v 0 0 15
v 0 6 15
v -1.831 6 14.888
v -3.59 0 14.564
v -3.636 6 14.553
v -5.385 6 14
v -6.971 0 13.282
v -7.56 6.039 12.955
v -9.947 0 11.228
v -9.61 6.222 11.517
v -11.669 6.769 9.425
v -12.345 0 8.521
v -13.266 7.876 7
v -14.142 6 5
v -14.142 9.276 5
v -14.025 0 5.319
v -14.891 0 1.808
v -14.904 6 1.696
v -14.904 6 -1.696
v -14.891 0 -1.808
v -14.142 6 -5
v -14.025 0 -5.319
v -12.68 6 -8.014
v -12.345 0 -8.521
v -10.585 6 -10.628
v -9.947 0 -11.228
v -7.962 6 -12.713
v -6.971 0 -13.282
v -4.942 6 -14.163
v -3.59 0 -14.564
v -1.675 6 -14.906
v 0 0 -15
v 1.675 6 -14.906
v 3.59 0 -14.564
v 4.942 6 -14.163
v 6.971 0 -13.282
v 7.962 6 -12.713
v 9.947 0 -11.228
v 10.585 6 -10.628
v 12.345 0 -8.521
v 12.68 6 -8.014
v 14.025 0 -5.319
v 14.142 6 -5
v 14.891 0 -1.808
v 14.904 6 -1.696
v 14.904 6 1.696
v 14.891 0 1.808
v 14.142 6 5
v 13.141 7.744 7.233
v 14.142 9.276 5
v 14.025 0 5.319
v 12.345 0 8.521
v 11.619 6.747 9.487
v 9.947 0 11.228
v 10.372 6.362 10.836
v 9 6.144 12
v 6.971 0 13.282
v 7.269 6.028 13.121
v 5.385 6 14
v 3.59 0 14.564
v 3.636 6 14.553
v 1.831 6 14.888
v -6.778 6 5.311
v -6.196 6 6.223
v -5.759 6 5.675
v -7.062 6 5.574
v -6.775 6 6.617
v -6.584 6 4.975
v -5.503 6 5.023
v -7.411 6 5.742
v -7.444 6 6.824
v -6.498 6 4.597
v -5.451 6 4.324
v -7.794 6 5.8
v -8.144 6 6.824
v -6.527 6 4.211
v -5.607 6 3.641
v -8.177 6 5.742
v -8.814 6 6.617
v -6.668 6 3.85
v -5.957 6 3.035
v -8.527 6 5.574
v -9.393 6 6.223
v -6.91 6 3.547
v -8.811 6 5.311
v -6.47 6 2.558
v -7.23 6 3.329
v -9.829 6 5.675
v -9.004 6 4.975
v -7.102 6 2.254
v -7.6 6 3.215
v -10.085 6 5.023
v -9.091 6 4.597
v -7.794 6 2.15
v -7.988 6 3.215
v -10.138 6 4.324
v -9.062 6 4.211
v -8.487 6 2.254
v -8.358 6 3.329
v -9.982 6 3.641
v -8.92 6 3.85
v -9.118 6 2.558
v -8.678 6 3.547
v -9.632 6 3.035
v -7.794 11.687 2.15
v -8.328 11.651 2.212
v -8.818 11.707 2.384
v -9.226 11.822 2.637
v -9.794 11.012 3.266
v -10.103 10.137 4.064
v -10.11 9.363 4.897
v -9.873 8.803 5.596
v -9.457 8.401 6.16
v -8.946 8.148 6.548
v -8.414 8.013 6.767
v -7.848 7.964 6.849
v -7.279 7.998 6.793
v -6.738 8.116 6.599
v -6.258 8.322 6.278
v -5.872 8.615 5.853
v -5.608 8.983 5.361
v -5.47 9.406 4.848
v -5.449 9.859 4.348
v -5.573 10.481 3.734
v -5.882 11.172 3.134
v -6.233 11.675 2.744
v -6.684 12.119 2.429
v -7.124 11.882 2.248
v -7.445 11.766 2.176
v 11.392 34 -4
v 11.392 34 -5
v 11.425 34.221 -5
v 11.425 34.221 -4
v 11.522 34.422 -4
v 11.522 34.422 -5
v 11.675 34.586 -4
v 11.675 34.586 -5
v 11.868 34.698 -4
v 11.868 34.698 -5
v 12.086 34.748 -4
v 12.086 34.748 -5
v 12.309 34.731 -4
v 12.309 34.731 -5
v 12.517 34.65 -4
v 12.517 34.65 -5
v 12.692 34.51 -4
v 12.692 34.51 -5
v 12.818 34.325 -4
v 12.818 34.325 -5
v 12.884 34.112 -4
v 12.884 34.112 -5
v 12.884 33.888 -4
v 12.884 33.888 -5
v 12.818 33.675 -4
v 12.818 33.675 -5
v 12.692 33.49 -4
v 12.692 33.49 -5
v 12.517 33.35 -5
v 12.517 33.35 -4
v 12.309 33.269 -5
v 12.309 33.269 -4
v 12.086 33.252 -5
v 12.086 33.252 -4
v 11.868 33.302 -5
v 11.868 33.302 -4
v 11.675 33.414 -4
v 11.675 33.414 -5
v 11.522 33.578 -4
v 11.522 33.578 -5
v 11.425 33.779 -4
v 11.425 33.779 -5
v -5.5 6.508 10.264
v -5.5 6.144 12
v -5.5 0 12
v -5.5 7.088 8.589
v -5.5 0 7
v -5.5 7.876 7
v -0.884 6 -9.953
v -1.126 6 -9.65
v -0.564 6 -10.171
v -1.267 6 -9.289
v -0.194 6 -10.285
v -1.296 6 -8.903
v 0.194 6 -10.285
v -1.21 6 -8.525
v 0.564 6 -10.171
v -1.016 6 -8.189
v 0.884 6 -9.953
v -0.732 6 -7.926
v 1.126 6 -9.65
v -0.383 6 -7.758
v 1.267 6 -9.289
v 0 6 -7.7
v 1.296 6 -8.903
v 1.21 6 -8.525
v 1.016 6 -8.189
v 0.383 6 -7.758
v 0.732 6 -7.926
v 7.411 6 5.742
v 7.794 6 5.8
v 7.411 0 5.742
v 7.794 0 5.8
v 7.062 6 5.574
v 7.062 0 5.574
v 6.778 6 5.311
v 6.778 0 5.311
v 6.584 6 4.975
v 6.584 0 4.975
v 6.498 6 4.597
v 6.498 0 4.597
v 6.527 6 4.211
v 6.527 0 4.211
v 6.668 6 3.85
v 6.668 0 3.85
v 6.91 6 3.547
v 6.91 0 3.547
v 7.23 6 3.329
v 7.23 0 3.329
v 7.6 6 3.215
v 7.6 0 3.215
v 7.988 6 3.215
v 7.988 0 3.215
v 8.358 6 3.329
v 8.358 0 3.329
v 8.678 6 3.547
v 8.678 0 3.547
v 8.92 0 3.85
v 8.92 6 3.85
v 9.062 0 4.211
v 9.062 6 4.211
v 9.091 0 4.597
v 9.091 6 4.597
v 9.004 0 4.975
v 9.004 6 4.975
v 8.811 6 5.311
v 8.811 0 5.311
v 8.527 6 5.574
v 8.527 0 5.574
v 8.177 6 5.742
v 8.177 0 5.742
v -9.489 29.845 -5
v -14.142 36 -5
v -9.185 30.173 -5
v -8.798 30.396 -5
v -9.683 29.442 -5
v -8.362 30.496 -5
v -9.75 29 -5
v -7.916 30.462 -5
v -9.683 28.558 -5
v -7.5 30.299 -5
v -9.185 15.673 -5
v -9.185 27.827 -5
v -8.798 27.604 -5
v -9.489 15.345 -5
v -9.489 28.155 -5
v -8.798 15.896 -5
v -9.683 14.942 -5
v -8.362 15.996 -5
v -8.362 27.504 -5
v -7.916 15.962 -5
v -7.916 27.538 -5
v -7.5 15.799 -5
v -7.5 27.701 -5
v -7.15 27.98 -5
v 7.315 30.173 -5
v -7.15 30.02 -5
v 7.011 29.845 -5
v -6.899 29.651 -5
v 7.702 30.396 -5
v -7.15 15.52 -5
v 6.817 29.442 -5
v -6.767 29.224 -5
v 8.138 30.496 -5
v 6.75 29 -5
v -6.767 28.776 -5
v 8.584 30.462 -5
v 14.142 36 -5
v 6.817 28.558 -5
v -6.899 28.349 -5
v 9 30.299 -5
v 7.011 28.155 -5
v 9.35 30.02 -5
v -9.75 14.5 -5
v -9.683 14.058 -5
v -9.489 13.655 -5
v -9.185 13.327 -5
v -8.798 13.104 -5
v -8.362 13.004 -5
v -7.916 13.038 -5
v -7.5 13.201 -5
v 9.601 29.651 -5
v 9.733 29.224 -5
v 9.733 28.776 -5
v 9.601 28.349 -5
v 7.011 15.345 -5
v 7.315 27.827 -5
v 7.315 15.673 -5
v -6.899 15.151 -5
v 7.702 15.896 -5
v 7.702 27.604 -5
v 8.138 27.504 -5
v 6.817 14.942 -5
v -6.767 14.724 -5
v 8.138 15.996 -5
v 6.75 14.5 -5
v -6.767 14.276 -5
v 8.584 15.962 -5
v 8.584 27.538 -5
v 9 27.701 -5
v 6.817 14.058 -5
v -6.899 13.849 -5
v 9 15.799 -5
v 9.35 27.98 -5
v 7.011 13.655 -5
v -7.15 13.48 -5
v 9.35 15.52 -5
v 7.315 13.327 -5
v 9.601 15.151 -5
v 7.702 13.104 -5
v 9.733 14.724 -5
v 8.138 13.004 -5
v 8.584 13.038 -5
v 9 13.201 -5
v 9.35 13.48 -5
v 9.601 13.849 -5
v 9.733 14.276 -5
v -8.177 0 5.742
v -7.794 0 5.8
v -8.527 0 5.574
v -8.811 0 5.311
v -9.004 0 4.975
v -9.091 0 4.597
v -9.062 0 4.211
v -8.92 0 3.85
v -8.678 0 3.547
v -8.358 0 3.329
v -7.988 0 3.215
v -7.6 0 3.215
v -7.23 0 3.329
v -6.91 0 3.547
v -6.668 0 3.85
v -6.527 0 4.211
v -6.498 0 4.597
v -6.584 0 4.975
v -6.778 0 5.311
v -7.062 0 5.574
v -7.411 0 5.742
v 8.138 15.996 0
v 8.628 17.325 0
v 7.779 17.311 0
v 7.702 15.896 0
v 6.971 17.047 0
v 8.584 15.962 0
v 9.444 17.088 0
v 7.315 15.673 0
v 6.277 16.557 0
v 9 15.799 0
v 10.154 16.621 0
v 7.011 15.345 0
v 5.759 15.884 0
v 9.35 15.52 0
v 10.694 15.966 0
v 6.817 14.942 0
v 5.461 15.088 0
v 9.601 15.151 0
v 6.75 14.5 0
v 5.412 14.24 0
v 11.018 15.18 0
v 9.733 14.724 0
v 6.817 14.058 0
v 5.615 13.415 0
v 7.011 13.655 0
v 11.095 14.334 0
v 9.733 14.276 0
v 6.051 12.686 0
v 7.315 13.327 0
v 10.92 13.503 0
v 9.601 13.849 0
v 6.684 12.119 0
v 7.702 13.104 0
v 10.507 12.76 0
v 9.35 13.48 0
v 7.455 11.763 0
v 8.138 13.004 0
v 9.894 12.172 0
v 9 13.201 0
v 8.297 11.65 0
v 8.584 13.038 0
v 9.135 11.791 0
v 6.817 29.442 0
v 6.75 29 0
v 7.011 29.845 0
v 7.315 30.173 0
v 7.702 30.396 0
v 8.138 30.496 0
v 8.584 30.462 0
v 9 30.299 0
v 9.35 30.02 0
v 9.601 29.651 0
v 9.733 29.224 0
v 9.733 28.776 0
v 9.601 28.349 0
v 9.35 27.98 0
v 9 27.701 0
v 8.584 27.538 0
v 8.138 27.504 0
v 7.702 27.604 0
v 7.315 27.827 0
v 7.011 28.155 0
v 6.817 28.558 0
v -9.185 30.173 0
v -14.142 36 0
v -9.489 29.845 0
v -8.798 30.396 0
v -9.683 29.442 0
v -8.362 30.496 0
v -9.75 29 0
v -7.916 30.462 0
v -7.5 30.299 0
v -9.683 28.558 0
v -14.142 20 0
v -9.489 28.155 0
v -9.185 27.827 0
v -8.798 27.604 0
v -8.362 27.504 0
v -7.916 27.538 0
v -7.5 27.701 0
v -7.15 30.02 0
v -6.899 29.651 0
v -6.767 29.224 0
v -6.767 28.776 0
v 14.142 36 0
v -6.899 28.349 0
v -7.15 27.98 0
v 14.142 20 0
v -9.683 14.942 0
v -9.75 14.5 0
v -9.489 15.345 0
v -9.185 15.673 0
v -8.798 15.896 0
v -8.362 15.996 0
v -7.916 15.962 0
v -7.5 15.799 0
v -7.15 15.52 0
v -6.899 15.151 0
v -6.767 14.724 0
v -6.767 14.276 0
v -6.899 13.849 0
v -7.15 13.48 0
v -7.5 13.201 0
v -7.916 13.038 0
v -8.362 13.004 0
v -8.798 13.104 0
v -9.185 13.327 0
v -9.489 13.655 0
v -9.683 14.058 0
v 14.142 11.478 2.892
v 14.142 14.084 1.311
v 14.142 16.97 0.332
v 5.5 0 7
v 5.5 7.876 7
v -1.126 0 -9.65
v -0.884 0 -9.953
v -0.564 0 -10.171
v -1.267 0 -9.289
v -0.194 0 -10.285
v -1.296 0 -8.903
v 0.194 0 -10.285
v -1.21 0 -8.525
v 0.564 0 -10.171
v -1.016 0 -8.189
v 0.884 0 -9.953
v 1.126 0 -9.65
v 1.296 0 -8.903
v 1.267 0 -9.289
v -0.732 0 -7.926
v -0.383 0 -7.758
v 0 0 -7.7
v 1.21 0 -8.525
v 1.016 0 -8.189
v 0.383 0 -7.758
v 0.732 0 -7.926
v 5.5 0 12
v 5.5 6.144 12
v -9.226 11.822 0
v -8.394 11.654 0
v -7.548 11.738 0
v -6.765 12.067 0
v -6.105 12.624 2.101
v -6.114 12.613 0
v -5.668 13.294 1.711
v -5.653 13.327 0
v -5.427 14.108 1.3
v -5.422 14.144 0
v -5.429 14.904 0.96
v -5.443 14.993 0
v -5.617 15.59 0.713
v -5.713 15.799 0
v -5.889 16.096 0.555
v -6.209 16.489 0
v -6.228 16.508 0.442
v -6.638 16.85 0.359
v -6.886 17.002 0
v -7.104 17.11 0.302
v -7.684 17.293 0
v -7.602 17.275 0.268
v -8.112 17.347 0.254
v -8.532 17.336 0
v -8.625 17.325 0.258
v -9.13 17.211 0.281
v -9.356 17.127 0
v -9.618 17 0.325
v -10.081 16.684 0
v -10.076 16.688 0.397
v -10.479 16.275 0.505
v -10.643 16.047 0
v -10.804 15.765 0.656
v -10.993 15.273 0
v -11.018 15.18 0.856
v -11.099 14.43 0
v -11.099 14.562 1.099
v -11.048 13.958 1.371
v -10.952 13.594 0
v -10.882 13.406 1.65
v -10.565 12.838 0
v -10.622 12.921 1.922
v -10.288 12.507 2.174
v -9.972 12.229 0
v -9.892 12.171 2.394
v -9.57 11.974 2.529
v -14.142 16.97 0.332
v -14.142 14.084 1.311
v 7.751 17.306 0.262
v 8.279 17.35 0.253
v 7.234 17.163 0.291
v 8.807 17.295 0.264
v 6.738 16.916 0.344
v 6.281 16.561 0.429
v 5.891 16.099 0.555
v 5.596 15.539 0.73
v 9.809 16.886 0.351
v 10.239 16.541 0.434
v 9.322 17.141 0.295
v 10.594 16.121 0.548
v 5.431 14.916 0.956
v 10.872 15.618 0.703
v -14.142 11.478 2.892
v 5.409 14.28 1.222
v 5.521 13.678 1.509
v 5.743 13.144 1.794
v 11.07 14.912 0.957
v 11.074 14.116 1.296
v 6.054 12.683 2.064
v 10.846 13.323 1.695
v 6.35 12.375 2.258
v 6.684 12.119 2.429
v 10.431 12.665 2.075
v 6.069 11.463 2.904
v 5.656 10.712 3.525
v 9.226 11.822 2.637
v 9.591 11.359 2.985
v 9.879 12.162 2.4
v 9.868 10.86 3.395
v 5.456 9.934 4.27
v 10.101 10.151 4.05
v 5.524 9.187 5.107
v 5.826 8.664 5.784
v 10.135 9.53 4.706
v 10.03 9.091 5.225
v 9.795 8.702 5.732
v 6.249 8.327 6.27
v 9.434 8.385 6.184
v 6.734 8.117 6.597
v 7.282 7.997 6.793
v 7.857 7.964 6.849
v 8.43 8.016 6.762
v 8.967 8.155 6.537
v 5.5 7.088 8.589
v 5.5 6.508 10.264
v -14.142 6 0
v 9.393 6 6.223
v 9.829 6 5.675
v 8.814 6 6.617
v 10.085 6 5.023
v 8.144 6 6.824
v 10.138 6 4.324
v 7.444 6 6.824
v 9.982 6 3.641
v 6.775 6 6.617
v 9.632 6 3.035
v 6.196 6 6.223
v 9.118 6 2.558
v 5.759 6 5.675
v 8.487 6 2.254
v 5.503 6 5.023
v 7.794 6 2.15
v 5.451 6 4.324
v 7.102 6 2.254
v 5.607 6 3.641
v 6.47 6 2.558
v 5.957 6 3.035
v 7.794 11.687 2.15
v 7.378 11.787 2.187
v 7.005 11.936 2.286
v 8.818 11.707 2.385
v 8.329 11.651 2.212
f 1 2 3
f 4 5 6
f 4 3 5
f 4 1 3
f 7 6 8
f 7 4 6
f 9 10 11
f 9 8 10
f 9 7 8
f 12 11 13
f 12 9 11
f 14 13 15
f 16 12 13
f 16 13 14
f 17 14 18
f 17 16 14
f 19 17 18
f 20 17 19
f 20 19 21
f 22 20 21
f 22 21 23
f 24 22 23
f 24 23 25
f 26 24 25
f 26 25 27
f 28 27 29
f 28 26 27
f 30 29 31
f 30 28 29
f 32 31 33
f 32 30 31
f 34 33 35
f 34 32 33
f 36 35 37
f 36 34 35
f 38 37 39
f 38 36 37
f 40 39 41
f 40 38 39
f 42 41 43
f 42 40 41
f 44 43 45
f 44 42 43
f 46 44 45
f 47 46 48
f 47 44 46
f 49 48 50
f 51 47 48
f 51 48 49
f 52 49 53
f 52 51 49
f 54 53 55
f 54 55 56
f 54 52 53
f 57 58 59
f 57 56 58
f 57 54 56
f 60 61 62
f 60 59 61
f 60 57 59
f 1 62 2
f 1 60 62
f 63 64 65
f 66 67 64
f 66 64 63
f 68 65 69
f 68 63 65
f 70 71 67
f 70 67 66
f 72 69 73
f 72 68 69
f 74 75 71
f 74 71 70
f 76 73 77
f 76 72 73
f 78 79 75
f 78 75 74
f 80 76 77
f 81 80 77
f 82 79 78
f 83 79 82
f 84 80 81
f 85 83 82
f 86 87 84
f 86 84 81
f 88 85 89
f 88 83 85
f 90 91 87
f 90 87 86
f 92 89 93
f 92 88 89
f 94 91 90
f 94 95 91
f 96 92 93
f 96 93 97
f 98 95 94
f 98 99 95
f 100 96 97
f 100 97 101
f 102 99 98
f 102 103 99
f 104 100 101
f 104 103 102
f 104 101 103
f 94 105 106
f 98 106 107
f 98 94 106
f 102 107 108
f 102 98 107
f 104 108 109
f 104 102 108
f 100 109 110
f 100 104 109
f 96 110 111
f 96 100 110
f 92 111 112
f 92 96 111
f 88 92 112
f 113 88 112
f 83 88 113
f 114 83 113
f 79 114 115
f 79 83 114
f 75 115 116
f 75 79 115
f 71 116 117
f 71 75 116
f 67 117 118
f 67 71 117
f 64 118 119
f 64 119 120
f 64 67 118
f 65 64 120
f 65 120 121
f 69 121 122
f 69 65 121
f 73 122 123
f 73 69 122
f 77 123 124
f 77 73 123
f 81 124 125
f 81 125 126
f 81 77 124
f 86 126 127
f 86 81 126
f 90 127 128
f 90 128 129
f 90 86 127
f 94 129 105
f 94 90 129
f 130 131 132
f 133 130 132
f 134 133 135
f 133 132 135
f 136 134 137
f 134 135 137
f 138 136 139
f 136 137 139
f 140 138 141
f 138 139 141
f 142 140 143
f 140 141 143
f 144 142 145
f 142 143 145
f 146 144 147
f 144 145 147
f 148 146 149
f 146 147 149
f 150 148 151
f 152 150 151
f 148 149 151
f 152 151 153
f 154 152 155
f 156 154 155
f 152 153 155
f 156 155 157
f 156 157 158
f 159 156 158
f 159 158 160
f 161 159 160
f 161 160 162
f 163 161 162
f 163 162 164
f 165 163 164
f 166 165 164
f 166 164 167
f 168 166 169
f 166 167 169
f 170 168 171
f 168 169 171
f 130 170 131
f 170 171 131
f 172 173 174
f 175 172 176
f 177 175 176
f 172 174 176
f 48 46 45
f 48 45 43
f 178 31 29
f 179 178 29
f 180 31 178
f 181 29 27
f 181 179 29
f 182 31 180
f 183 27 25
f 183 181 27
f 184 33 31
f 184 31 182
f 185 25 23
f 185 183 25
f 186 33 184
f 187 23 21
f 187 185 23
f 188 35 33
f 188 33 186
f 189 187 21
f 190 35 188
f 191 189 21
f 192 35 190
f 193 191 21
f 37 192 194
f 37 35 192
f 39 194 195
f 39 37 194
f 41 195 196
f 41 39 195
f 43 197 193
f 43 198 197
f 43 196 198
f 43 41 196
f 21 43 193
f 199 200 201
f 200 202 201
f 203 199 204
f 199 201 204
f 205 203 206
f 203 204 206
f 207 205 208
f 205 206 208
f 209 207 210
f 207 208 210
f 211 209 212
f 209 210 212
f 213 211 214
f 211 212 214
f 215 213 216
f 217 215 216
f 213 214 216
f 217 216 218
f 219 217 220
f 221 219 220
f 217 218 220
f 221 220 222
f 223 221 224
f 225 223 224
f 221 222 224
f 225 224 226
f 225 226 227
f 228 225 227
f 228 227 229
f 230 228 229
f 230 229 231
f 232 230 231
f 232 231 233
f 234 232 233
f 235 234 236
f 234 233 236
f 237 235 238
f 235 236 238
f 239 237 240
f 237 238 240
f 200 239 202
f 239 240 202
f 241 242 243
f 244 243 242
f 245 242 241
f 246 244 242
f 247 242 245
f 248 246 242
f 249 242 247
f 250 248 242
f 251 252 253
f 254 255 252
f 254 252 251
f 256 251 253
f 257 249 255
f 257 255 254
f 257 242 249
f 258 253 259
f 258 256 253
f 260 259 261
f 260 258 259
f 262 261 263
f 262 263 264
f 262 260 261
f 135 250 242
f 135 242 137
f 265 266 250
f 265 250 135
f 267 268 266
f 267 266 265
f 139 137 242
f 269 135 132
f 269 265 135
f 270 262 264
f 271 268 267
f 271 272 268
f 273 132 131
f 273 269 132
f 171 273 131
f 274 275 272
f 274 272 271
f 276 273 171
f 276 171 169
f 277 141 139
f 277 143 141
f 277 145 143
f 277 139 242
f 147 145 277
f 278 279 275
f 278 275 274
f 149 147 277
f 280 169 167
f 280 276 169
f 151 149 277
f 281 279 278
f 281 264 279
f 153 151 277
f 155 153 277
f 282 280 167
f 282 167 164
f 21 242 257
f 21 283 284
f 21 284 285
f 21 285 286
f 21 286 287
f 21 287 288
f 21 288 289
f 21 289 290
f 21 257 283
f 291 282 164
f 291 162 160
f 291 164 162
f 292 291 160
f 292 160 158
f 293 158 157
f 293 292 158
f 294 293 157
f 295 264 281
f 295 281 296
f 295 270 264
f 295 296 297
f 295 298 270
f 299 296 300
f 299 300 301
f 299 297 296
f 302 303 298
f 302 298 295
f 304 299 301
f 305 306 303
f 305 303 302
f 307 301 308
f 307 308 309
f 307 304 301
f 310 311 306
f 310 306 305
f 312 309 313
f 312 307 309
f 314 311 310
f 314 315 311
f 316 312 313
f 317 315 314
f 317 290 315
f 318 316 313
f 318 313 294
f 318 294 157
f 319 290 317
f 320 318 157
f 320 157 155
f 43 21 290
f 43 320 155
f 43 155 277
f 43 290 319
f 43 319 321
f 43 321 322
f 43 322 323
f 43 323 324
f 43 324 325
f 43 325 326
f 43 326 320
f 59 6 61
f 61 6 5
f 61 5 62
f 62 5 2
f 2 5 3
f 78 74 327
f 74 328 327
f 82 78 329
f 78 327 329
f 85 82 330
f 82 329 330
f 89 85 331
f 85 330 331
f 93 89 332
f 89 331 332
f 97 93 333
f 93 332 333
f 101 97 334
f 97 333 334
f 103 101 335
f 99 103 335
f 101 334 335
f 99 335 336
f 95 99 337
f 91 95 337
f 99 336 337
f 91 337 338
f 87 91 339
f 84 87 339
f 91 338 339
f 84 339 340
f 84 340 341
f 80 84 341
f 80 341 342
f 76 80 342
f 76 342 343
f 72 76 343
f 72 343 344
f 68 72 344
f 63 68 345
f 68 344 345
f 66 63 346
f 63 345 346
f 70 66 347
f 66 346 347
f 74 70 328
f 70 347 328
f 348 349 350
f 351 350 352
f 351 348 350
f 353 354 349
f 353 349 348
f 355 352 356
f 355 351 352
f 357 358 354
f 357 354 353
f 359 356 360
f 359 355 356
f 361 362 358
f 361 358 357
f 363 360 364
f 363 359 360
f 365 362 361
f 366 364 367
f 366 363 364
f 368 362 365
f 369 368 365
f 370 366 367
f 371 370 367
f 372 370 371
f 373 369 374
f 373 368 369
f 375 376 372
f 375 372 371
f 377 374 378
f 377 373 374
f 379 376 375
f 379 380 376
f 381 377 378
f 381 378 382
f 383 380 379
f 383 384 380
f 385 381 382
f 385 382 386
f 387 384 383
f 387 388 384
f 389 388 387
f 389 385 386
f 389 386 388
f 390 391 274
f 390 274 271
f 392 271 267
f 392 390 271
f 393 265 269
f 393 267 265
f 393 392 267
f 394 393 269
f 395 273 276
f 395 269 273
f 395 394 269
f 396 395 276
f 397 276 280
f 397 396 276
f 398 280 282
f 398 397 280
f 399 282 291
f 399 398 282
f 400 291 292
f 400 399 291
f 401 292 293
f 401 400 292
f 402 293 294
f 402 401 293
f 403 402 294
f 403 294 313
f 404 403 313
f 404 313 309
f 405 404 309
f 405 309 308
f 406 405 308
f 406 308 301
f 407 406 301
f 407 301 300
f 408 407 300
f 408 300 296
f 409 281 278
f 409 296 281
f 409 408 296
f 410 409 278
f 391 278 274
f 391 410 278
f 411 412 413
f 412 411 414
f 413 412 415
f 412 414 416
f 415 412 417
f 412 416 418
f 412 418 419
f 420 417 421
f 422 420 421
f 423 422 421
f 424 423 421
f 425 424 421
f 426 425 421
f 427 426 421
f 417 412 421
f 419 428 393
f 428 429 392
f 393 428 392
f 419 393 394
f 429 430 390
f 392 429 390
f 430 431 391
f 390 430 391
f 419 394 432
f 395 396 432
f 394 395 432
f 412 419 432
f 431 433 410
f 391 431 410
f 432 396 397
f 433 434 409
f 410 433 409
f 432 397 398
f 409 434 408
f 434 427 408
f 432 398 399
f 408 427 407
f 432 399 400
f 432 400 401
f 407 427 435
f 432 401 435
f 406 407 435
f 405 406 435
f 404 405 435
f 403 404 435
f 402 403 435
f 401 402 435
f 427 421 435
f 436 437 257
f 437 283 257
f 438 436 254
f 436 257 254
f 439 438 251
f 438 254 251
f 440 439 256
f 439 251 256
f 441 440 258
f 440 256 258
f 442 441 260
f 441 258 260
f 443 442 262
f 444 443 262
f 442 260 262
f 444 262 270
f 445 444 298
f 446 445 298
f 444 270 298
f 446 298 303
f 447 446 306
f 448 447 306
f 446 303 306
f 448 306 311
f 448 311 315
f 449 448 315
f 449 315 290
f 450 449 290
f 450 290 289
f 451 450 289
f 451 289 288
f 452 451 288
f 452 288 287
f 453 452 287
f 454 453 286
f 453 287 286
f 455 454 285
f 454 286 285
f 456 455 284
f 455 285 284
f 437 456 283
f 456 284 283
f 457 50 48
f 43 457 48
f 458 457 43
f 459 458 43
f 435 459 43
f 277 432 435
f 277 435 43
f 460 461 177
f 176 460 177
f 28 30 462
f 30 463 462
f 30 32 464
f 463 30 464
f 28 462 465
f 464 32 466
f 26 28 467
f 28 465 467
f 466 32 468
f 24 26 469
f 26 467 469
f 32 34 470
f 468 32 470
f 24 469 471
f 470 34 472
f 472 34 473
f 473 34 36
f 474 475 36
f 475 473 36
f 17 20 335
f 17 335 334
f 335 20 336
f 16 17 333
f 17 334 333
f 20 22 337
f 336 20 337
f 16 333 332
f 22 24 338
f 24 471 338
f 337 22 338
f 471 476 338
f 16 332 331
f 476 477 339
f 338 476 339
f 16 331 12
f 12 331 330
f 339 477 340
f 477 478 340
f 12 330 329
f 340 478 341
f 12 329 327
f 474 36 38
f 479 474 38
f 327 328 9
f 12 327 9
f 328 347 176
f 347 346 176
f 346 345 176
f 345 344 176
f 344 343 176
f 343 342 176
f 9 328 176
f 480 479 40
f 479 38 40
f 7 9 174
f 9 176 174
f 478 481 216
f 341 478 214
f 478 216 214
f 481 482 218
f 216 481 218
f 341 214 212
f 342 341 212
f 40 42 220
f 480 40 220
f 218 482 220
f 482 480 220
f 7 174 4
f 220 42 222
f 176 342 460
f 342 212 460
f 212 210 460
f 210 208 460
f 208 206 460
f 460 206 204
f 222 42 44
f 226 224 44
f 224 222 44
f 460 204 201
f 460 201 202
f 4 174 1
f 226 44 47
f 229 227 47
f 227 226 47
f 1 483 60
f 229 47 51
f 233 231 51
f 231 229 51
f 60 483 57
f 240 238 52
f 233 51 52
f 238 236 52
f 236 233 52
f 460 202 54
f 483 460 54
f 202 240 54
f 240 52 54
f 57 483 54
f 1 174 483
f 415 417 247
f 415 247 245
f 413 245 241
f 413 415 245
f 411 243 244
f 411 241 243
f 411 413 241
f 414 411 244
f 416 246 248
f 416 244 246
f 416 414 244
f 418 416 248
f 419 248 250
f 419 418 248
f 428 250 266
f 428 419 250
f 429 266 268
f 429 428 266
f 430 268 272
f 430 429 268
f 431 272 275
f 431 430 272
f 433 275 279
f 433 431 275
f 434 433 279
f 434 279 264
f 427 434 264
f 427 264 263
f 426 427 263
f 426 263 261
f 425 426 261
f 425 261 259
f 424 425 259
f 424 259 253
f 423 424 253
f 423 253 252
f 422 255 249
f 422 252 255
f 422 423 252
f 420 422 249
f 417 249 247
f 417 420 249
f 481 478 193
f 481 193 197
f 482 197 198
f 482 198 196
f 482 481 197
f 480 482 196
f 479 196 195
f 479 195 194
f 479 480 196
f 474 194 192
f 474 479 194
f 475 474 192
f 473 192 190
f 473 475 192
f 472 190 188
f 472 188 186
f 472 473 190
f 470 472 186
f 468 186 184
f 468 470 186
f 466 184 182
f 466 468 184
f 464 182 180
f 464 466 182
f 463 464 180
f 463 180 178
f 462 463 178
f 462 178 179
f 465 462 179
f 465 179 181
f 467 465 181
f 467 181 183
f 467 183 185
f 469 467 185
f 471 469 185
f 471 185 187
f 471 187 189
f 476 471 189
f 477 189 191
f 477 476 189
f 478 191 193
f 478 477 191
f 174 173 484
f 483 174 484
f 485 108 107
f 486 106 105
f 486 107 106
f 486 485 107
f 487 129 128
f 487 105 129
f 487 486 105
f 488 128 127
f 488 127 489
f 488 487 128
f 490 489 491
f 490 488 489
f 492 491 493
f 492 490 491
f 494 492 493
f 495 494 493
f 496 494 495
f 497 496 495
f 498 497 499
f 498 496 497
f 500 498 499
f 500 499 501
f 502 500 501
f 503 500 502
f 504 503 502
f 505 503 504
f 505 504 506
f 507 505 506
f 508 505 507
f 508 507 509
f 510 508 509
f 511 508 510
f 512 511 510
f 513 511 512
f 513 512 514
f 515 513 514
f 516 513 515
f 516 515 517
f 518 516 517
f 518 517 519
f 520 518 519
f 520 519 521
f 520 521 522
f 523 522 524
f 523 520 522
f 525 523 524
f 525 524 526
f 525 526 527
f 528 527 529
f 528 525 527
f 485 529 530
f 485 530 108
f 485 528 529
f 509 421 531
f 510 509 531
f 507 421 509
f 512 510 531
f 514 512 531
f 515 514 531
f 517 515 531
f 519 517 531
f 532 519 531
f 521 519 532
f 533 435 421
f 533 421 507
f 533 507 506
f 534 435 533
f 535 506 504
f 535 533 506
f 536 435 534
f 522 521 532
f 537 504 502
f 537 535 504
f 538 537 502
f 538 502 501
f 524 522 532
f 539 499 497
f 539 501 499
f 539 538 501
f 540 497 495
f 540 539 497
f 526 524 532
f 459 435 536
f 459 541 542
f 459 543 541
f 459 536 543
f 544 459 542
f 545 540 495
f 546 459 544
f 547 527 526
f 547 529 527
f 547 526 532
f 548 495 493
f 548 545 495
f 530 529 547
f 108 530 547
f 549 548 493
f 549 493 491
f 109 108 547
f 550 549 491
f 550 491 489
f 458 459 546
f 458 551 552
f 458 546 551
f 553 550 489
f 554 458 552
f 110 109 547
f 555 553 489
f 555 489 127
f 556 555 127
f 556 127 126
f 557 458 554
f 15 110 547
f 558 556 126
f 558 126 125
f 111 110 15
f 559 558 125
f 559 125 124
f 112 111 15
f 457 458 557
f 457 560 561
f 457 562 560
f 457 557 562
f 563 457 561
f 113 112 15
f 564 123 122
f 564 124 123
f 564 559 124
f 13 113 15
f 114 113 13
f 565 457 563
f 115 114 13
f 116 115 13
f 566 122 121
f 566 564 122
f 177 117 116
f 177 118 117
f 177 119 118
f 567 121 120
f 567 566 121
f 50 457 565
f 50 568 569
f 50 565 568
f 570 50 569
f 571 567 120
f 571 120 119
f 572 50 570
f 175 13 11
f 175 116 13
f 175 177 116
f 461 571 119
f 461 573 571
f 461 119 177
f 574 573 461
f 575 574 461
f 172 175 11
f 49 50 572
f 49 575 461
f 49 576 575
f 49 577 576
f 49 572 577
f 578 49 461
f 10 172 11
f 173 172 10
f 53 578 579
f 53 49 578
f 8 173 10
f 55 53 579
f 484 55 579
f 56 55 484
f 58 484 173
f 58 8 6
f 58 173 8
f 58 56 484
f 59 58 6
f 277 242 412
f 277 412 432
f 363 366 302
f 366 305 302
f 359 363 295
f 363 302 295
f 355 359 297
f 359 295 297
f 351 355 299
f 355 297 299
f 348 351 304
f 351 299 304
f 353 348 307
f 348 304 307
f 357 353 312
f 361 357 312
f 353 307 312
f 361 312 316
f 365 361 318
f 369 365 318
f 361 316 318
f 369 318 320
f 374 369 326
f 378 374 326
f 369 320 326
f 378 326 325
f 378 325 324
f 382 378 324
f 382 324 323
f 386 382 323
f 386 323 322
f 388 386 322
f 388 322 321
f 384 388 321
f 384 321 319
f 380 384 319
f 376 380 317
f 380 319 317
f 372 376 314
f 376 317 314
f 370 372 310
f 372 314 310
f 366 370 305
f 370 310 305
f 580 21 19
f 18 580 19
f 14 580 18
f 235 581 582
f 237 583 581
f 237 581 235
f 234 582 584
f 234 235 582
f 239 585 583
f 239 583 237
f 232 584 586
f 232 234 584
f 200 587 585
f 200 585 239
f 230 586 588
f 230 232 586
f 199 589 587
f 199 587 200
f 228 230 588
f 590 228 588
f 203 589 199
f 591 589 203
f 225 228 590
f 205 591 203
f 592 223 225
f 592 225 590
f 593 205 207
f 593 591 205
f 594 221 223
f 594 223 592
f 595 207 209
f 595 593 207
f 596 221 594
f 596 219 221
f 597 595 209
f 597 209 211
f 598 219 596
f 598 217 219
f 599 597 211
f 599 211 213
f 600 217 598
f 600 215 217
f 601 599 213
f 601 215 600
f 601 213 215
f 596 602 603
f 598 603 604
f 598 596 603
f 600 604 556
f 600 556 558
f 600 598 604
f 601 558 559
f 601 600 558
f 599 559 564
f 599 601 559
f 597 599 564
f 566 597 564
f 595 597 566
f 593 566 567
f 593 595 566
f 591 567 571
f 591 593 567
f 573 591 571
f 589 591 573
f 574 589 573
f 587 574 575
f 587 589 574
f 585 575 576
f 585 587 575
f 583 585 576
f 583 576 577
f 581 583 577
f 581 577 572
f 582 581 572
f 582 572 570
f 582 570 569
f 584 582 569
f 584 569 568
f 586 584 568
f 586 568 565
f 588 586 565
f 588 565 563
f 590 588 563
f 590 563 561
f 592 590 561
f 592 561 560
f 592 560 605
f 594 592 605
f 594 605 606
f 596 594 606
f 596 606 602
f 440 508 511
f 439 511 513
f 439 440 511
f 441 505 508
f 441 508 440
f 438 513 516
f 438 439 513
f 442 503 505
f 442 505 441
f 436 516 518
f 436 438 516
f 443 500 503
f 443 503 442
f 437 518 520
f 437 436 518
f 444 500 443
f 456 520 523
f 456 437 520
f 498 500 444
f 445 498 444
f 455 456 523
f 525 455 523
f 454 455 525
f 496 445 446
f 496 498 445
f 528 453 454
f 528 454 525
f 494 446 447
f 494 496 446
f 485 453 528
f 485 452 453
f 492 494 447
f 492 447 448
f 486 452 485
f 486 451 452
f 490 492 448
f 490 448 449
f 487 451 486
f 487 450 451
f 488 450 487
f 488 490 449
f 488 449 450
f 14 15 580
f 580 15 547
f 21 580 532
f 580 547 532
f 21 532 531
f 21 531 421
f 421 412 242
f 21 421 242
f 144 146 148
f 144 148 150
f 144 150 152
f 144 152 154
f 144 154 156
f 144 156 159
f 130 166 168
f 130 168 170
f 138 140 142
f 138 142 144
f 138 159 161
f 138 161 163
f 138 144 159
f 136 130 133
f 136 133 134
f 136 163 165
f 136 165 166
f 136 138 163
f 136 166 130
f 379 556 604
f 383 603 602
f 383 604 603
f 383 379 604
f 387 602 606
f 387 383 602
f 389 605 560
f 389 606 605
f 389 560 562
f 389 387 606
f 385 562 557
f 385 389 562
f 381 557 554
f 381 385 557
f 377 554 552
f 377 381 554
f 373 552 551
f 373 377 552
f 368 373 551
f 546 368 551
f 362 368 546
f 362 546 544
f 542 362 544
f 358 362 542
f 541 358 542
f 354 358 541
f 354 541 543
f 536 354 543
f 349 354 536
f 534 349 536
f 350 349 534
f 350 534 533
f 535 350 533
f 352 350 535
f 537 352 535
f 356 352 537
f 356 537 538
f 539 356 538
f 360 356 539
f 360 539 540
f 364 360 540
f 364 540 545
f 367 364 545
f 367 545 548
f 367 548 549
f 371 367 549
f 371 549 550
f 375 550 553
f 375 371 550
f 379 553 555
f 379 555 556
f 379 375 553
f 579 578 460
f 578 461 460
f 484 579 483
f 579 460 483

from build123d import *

# Parameters (mm, degrees)
SKETCH_1_R               = 15
SKETCH_1_R_2             = 1.3
SKETCH_1_W               = 11
SKETCH_1_H               = 5
EXTRUDE_1_DEPTH          = 6
SKETCH_2_W               = 28.284271248
SKETCH_2_H               = 5
EXTRUDE_2_DEPTH          = 30
CUT_EXTRUDE_1_DEPTH      = 44.829214002
CUT_EXTRUDE_1_DEPTH_BACK = 44.829214002
SKETCH_3_R               = 1.5
FILLET_2_R               = 14
SKETCH_4_R               = 2.35
CUT_EXTRUDE_2_DEPTH      = 37.742346223
SKETCH_5_R               = 2.85
CUT_EXTRUDE_3_DEPTH      = 42.785164903
SKETCH_6_R               = 0.75
CUT_EXTRUDE_4_DEPTH      = 1


with BuildPart() as part:
    # 草图1 → 凸台-拉伸1 (new body)
    with BuildSketch(Plane(origin=(0, 0, 0), x_dir=(1, 0, 0), z_dir=(0, 1, 0))):
        with Locations(Location((0, 0, 0), (0, 0, 270))):
            Circle(SKETCH_1_R)
        with Locations(Location((0, 9, 0), (0, 0, 270))):
            Circle(SKETCH_1_R_2, mode=Mode.SUBTRACT)
        with Locations(Location((7.794228634, -4.5, 0), (0, 0, 270))):
            Circle(SKETCH_1_R_2, mode=Mode.SUBTRACT)
        with Locations(Location((-7.794228634, -4.5, 0), (0, 0, 270))):
            Circle(SKETCH_1_R_2, mode=Mode.SUBTRACT)
        with Locations((0, -9.5)):
            Rectangle(SKETCH_1_W, SKETCH_1_H, mode=Mode.SUBTRACT)
    extrude(amount=EXTRUDE_1_DEPTH)

    # 草图2 → 凸台-拉伸2 (add)
    with BuildSketch(Plane(origin=(0, 6, 0), x_dir=(1, 0, 0), z_dir=(0, 1, 0))):
        with Locations((0, 2.5)):
            Rectangle(SKETCH_2_W, SKETCH_2_H)
    extrude(amount=EXTRUDE_2_DEPTH)

    # 草图3 → 切除-拉伸1 (cut, two sides: drawn at the far end of the back side and taken through both)
    with BuildSketch(Plane(origin=(0, 0, -5), x_dir=(-1, 0, 0), z_dir=(0, 0, -1)).offset(-CUT_EXTRUDE_1_DEPTH_BACK)):
        with Locations((-8.25, 14.5)):
            Circle(SKETCH_3_R)
        with Locations((8.25, 14.5)):
            Circle(SKETCH_3_R)
        with Locations((8.25, 29)):
            Circle(SKETCH_3_R)
        with Locations((-8.25, 29)):
            Circle(SKETCH_3_R)
    extrude(amount=CUT_EXTRUDE_1_DEPTH + CUT_EXTRUDE_1_DEPTH_BACK, mode=Mode.SUBTRACT)

    # 圆角2
    # the kernel refuses this fillet: 14 mm, written as the material it adds along each edge
    with BuildSketch(Plane(origin=(49.142135624, 6, 0), x_dir=(0, 0, 1), z_dir=(-1, 0, 0))) as fillet_2_piece_1_section:
        with BuildLine():
            CenterArc((FILLET_2_R, FILLET_2_R), FILLET_2_R, 180, 90)
            Line((0, FILLET_2_R), (0, 0))
            Line((0, 0), (FILLET_2_R, 0))
        make_face()
    fillet_2_piece_1 = extrude(amount=98.284271247, mode=Mode.PRIVATE)
    fillet_2_piece_1 = fillet_2_piece_1 & Plane(origin=(0, 6.047138864, 0), x_dir=(0, 0, 1), z_dir=(0, -1, 0)) * Cylinder(15, 253, mode=Mode.PRIVATE)
    fillet_2_piece_1 = split(fillet_2_piece_1, bisect_by=Plane(origin=(6.949412774, 6.047138864, 12), z_dir=(0, 0, 1)), keep=Keep.TOP, mode=Mode.PRIVATE)
    add(fillet_2_piece_1)
    with BuildSketch(Plane(origin=(14.142135624, 6, 0), x_dir=(0, 0, 1), z_dir=(-1, 0, 0))) as fillet_2_piece_2_section:
        with BuildLine():
            CenterArc((FILLET_2_R, FILLET_2_R), FILLET_2_R, 180, 90)
            Line((0, FILLET_2_R), (0, 0))
            Line((0, 0), (FILLET_2_R, 0))
        make_face()
    fillet_2_piece_2 = extrude(amount=63.284271247, mode=Mode.PRIVATE)
    fillet_2_piece_2 = fillet_2_piece_2 & Plane(origin=(0, 6.60039406, 0), x_dir=(0, 0, 1), z_dir=(0, -1, 0)) * Cylinder(15, 183, mode=Mode.PRIVATE)
    fillet_2_piece_2 = fillet_2_piece_2 - Plane(origin=(7.794228634, 6.60039406, 4.5), x_dir=(0, 0, 1), z_dir=(0, -1, 0)) * Cylinder(1.3, 183, mode=Mode.PRIVATE)
    fillet_2_piece_2 = split(fillet_2_piece_2, bisect_by=Plane(origin=(5.5, 6.60039406, 8.461968408), z_dir=(1, 0, 0)), keep=Keep.TOP, mode=Mode.PRIVATE)
    fillet_2_piece_2 = fillet_2_piece_2 - Plane(origin=(8.25, 14.5, 8.461968408), x_dir=(-1, 0, 0), z_dir=(0, 0, -1)) * Cylinder(1.5, 183, mode=Mode.PRIVATE)
    add(fillet_2_piece_2)
    with BuildSketch(Plane(origin=(49.142135624, 6, 0), x_dir=(0, 0, 1), z_dir=(-1, 0, 0))) as fillet_2_piece_3_section:
        with BuildLine():
            CenterArc((FILLET_2_R, FILLET_2_R), FILLET_2_R, 180, 90)
            Line((0, FILLET_2_R), (0, 0))
            Line((0, 0), (FILLET_2_R, 0))
        make_face()
    fillet_2_piece_3 = extrude(amount=63.284271247, mode=Mode.PRIVATE)
    fillet_2_piece_3 = fillet_2_piece_3 & Plane(origin=(0, 9.416347891, 0), x_dir=(0, 0, 1), z_dir=(0, -1, 0)) * Cylinder(15, 183, mode=Mode.PRIVATE)
    fillet_2_piece_3 = fillet_2_piece_3 - Plane(origin=(-7.794228634, 9.416347891, 4.5), x_dir=(0, 0, 1), z_dir=(0, -1, 0)) * Cylinder(1.3, 183, mode=Mode.PRIVATE)
    fillet_2_piece_3 = split(fillet_2_piece_3, bisect_by=Plane(origin=(0, 9.416347891, 7), z_dir=(0, 0, -1)), keep=Keep.TOP, mode=Mode.PRIVATE)
    fillet_2_piece_3 = split(fillet_2_piece_3, bisect_by=Plane(origin=(5.5, 9.416347891, 2.497543019), z_dir=(-1, 0, 0)), keep=Keep.TOP, mode=Mode.PRIVATE)
    fillet_2_piece_3 = fillet_2_piece_3 - Plane(origin=(-8.25, 14.5, 2.497543019), x_dir=(-1, 0, 0), z_dir=(0, 0, -1)) * Cylinder(1.5, 183, mode=Mode.PRIVATE)
    add(fillet_2_piece_3)
    with BuildSketch(Plane(origin=(49.142135624, 6, 0), x_dir=(0, 0, 1), z_dir=(-1, 0, 0))) as fillet_2_piece_4_section:
        with BuildLine():
            CenterArc((FILLET_2_R, FILLET_2_R), FILLET_2_R, 180, 90)
            Line((0, FILLET_2_R), (0, 0))
            Line((0, 0), (FILLET_2_R, 0))
        make_face()
    fillet_2_piece_4 = extrude(amount=98.284271247, mode=Mode.PRIVATE)
    fillet_2_piece_4 = fillet_2_piece_4 & Plane(origin=(0, 6.600394024, 0), x_dir=(0, 0, 1), z_dir=(0, -1, 0)) * Cylinder(15, 253, mode=Mode.PRIVATE)
    fillet_2_piece_4 = split(fillet_2_piece_4, bisect_by=Plane(origin=(-8.900767253, 6.600394024, 7), z_dir=(0, 0, 1)), keep=Keep.TOP, mode=Mode.PRIVATE)
    fillet_2_piece_4 = split(fillet_2_piece_4, bisect_by=Plane(origin=(-5.5, 6.600394024, 8.461968263), z_dir=(-1, 0, 0)), keep=Keep.TOP, mode=Mode.PRIVATE)
    add(fillet_2_piece_4)

    # 草图4 → 切除-拉伸2 (cut, through all)
    with BuildSketch(Plane(origin=(0, 6, 0), x_dir=(1, 0, 0), z_dir=(0, 1, 0))):
        with Locations((0, 9)):
            Circle(SKETCH_4_R)
        with Locations(Location((7.794228634, -4.5, 0), (0, 0, 90))):
            Circle(SKETCH_4_R)
        with Locations(Location((-7.794228634, -4.5, 0), (0, 0, 90))):
            Circle(SKETCH_4_R)
    extrude(amount=CUT_EXTRUDE_2_DEPTH, mode=Mode.SUBTRACT)

    # 草图5 → 切除-拉伸3 (cut, through all)
    with BuildSketch(Plane.XY):
        with Locations(Location((8.25, 14.5, 0), (0, 0, 236.662521272))):
            Circle(SKETCH_5_R)
        with Locations(Location((-8.25, 14.5, 0), (0, 0, 249.9708463))):
            Circle(SKETCH_5_R)
    extrude(amount=CUT_EXTRUDE_3_DEPTH, mode=Mode.SUBTRACT)

    # 草图6 → 切除-拉伸4 (cut)
    with BuildSketch(Plane(origin=(0, 0, -5), x_dir=(-1, 0, 0), z_dir=(0, 0, -1))):
        with Locations((-12.142135624, 34)):
            Circle(SKETCH_6_R)
    extrude(amount=-CUT_EXTRUDE_4_DEPTH, mode=Mode.SUBTRACT)


solid = part.part
